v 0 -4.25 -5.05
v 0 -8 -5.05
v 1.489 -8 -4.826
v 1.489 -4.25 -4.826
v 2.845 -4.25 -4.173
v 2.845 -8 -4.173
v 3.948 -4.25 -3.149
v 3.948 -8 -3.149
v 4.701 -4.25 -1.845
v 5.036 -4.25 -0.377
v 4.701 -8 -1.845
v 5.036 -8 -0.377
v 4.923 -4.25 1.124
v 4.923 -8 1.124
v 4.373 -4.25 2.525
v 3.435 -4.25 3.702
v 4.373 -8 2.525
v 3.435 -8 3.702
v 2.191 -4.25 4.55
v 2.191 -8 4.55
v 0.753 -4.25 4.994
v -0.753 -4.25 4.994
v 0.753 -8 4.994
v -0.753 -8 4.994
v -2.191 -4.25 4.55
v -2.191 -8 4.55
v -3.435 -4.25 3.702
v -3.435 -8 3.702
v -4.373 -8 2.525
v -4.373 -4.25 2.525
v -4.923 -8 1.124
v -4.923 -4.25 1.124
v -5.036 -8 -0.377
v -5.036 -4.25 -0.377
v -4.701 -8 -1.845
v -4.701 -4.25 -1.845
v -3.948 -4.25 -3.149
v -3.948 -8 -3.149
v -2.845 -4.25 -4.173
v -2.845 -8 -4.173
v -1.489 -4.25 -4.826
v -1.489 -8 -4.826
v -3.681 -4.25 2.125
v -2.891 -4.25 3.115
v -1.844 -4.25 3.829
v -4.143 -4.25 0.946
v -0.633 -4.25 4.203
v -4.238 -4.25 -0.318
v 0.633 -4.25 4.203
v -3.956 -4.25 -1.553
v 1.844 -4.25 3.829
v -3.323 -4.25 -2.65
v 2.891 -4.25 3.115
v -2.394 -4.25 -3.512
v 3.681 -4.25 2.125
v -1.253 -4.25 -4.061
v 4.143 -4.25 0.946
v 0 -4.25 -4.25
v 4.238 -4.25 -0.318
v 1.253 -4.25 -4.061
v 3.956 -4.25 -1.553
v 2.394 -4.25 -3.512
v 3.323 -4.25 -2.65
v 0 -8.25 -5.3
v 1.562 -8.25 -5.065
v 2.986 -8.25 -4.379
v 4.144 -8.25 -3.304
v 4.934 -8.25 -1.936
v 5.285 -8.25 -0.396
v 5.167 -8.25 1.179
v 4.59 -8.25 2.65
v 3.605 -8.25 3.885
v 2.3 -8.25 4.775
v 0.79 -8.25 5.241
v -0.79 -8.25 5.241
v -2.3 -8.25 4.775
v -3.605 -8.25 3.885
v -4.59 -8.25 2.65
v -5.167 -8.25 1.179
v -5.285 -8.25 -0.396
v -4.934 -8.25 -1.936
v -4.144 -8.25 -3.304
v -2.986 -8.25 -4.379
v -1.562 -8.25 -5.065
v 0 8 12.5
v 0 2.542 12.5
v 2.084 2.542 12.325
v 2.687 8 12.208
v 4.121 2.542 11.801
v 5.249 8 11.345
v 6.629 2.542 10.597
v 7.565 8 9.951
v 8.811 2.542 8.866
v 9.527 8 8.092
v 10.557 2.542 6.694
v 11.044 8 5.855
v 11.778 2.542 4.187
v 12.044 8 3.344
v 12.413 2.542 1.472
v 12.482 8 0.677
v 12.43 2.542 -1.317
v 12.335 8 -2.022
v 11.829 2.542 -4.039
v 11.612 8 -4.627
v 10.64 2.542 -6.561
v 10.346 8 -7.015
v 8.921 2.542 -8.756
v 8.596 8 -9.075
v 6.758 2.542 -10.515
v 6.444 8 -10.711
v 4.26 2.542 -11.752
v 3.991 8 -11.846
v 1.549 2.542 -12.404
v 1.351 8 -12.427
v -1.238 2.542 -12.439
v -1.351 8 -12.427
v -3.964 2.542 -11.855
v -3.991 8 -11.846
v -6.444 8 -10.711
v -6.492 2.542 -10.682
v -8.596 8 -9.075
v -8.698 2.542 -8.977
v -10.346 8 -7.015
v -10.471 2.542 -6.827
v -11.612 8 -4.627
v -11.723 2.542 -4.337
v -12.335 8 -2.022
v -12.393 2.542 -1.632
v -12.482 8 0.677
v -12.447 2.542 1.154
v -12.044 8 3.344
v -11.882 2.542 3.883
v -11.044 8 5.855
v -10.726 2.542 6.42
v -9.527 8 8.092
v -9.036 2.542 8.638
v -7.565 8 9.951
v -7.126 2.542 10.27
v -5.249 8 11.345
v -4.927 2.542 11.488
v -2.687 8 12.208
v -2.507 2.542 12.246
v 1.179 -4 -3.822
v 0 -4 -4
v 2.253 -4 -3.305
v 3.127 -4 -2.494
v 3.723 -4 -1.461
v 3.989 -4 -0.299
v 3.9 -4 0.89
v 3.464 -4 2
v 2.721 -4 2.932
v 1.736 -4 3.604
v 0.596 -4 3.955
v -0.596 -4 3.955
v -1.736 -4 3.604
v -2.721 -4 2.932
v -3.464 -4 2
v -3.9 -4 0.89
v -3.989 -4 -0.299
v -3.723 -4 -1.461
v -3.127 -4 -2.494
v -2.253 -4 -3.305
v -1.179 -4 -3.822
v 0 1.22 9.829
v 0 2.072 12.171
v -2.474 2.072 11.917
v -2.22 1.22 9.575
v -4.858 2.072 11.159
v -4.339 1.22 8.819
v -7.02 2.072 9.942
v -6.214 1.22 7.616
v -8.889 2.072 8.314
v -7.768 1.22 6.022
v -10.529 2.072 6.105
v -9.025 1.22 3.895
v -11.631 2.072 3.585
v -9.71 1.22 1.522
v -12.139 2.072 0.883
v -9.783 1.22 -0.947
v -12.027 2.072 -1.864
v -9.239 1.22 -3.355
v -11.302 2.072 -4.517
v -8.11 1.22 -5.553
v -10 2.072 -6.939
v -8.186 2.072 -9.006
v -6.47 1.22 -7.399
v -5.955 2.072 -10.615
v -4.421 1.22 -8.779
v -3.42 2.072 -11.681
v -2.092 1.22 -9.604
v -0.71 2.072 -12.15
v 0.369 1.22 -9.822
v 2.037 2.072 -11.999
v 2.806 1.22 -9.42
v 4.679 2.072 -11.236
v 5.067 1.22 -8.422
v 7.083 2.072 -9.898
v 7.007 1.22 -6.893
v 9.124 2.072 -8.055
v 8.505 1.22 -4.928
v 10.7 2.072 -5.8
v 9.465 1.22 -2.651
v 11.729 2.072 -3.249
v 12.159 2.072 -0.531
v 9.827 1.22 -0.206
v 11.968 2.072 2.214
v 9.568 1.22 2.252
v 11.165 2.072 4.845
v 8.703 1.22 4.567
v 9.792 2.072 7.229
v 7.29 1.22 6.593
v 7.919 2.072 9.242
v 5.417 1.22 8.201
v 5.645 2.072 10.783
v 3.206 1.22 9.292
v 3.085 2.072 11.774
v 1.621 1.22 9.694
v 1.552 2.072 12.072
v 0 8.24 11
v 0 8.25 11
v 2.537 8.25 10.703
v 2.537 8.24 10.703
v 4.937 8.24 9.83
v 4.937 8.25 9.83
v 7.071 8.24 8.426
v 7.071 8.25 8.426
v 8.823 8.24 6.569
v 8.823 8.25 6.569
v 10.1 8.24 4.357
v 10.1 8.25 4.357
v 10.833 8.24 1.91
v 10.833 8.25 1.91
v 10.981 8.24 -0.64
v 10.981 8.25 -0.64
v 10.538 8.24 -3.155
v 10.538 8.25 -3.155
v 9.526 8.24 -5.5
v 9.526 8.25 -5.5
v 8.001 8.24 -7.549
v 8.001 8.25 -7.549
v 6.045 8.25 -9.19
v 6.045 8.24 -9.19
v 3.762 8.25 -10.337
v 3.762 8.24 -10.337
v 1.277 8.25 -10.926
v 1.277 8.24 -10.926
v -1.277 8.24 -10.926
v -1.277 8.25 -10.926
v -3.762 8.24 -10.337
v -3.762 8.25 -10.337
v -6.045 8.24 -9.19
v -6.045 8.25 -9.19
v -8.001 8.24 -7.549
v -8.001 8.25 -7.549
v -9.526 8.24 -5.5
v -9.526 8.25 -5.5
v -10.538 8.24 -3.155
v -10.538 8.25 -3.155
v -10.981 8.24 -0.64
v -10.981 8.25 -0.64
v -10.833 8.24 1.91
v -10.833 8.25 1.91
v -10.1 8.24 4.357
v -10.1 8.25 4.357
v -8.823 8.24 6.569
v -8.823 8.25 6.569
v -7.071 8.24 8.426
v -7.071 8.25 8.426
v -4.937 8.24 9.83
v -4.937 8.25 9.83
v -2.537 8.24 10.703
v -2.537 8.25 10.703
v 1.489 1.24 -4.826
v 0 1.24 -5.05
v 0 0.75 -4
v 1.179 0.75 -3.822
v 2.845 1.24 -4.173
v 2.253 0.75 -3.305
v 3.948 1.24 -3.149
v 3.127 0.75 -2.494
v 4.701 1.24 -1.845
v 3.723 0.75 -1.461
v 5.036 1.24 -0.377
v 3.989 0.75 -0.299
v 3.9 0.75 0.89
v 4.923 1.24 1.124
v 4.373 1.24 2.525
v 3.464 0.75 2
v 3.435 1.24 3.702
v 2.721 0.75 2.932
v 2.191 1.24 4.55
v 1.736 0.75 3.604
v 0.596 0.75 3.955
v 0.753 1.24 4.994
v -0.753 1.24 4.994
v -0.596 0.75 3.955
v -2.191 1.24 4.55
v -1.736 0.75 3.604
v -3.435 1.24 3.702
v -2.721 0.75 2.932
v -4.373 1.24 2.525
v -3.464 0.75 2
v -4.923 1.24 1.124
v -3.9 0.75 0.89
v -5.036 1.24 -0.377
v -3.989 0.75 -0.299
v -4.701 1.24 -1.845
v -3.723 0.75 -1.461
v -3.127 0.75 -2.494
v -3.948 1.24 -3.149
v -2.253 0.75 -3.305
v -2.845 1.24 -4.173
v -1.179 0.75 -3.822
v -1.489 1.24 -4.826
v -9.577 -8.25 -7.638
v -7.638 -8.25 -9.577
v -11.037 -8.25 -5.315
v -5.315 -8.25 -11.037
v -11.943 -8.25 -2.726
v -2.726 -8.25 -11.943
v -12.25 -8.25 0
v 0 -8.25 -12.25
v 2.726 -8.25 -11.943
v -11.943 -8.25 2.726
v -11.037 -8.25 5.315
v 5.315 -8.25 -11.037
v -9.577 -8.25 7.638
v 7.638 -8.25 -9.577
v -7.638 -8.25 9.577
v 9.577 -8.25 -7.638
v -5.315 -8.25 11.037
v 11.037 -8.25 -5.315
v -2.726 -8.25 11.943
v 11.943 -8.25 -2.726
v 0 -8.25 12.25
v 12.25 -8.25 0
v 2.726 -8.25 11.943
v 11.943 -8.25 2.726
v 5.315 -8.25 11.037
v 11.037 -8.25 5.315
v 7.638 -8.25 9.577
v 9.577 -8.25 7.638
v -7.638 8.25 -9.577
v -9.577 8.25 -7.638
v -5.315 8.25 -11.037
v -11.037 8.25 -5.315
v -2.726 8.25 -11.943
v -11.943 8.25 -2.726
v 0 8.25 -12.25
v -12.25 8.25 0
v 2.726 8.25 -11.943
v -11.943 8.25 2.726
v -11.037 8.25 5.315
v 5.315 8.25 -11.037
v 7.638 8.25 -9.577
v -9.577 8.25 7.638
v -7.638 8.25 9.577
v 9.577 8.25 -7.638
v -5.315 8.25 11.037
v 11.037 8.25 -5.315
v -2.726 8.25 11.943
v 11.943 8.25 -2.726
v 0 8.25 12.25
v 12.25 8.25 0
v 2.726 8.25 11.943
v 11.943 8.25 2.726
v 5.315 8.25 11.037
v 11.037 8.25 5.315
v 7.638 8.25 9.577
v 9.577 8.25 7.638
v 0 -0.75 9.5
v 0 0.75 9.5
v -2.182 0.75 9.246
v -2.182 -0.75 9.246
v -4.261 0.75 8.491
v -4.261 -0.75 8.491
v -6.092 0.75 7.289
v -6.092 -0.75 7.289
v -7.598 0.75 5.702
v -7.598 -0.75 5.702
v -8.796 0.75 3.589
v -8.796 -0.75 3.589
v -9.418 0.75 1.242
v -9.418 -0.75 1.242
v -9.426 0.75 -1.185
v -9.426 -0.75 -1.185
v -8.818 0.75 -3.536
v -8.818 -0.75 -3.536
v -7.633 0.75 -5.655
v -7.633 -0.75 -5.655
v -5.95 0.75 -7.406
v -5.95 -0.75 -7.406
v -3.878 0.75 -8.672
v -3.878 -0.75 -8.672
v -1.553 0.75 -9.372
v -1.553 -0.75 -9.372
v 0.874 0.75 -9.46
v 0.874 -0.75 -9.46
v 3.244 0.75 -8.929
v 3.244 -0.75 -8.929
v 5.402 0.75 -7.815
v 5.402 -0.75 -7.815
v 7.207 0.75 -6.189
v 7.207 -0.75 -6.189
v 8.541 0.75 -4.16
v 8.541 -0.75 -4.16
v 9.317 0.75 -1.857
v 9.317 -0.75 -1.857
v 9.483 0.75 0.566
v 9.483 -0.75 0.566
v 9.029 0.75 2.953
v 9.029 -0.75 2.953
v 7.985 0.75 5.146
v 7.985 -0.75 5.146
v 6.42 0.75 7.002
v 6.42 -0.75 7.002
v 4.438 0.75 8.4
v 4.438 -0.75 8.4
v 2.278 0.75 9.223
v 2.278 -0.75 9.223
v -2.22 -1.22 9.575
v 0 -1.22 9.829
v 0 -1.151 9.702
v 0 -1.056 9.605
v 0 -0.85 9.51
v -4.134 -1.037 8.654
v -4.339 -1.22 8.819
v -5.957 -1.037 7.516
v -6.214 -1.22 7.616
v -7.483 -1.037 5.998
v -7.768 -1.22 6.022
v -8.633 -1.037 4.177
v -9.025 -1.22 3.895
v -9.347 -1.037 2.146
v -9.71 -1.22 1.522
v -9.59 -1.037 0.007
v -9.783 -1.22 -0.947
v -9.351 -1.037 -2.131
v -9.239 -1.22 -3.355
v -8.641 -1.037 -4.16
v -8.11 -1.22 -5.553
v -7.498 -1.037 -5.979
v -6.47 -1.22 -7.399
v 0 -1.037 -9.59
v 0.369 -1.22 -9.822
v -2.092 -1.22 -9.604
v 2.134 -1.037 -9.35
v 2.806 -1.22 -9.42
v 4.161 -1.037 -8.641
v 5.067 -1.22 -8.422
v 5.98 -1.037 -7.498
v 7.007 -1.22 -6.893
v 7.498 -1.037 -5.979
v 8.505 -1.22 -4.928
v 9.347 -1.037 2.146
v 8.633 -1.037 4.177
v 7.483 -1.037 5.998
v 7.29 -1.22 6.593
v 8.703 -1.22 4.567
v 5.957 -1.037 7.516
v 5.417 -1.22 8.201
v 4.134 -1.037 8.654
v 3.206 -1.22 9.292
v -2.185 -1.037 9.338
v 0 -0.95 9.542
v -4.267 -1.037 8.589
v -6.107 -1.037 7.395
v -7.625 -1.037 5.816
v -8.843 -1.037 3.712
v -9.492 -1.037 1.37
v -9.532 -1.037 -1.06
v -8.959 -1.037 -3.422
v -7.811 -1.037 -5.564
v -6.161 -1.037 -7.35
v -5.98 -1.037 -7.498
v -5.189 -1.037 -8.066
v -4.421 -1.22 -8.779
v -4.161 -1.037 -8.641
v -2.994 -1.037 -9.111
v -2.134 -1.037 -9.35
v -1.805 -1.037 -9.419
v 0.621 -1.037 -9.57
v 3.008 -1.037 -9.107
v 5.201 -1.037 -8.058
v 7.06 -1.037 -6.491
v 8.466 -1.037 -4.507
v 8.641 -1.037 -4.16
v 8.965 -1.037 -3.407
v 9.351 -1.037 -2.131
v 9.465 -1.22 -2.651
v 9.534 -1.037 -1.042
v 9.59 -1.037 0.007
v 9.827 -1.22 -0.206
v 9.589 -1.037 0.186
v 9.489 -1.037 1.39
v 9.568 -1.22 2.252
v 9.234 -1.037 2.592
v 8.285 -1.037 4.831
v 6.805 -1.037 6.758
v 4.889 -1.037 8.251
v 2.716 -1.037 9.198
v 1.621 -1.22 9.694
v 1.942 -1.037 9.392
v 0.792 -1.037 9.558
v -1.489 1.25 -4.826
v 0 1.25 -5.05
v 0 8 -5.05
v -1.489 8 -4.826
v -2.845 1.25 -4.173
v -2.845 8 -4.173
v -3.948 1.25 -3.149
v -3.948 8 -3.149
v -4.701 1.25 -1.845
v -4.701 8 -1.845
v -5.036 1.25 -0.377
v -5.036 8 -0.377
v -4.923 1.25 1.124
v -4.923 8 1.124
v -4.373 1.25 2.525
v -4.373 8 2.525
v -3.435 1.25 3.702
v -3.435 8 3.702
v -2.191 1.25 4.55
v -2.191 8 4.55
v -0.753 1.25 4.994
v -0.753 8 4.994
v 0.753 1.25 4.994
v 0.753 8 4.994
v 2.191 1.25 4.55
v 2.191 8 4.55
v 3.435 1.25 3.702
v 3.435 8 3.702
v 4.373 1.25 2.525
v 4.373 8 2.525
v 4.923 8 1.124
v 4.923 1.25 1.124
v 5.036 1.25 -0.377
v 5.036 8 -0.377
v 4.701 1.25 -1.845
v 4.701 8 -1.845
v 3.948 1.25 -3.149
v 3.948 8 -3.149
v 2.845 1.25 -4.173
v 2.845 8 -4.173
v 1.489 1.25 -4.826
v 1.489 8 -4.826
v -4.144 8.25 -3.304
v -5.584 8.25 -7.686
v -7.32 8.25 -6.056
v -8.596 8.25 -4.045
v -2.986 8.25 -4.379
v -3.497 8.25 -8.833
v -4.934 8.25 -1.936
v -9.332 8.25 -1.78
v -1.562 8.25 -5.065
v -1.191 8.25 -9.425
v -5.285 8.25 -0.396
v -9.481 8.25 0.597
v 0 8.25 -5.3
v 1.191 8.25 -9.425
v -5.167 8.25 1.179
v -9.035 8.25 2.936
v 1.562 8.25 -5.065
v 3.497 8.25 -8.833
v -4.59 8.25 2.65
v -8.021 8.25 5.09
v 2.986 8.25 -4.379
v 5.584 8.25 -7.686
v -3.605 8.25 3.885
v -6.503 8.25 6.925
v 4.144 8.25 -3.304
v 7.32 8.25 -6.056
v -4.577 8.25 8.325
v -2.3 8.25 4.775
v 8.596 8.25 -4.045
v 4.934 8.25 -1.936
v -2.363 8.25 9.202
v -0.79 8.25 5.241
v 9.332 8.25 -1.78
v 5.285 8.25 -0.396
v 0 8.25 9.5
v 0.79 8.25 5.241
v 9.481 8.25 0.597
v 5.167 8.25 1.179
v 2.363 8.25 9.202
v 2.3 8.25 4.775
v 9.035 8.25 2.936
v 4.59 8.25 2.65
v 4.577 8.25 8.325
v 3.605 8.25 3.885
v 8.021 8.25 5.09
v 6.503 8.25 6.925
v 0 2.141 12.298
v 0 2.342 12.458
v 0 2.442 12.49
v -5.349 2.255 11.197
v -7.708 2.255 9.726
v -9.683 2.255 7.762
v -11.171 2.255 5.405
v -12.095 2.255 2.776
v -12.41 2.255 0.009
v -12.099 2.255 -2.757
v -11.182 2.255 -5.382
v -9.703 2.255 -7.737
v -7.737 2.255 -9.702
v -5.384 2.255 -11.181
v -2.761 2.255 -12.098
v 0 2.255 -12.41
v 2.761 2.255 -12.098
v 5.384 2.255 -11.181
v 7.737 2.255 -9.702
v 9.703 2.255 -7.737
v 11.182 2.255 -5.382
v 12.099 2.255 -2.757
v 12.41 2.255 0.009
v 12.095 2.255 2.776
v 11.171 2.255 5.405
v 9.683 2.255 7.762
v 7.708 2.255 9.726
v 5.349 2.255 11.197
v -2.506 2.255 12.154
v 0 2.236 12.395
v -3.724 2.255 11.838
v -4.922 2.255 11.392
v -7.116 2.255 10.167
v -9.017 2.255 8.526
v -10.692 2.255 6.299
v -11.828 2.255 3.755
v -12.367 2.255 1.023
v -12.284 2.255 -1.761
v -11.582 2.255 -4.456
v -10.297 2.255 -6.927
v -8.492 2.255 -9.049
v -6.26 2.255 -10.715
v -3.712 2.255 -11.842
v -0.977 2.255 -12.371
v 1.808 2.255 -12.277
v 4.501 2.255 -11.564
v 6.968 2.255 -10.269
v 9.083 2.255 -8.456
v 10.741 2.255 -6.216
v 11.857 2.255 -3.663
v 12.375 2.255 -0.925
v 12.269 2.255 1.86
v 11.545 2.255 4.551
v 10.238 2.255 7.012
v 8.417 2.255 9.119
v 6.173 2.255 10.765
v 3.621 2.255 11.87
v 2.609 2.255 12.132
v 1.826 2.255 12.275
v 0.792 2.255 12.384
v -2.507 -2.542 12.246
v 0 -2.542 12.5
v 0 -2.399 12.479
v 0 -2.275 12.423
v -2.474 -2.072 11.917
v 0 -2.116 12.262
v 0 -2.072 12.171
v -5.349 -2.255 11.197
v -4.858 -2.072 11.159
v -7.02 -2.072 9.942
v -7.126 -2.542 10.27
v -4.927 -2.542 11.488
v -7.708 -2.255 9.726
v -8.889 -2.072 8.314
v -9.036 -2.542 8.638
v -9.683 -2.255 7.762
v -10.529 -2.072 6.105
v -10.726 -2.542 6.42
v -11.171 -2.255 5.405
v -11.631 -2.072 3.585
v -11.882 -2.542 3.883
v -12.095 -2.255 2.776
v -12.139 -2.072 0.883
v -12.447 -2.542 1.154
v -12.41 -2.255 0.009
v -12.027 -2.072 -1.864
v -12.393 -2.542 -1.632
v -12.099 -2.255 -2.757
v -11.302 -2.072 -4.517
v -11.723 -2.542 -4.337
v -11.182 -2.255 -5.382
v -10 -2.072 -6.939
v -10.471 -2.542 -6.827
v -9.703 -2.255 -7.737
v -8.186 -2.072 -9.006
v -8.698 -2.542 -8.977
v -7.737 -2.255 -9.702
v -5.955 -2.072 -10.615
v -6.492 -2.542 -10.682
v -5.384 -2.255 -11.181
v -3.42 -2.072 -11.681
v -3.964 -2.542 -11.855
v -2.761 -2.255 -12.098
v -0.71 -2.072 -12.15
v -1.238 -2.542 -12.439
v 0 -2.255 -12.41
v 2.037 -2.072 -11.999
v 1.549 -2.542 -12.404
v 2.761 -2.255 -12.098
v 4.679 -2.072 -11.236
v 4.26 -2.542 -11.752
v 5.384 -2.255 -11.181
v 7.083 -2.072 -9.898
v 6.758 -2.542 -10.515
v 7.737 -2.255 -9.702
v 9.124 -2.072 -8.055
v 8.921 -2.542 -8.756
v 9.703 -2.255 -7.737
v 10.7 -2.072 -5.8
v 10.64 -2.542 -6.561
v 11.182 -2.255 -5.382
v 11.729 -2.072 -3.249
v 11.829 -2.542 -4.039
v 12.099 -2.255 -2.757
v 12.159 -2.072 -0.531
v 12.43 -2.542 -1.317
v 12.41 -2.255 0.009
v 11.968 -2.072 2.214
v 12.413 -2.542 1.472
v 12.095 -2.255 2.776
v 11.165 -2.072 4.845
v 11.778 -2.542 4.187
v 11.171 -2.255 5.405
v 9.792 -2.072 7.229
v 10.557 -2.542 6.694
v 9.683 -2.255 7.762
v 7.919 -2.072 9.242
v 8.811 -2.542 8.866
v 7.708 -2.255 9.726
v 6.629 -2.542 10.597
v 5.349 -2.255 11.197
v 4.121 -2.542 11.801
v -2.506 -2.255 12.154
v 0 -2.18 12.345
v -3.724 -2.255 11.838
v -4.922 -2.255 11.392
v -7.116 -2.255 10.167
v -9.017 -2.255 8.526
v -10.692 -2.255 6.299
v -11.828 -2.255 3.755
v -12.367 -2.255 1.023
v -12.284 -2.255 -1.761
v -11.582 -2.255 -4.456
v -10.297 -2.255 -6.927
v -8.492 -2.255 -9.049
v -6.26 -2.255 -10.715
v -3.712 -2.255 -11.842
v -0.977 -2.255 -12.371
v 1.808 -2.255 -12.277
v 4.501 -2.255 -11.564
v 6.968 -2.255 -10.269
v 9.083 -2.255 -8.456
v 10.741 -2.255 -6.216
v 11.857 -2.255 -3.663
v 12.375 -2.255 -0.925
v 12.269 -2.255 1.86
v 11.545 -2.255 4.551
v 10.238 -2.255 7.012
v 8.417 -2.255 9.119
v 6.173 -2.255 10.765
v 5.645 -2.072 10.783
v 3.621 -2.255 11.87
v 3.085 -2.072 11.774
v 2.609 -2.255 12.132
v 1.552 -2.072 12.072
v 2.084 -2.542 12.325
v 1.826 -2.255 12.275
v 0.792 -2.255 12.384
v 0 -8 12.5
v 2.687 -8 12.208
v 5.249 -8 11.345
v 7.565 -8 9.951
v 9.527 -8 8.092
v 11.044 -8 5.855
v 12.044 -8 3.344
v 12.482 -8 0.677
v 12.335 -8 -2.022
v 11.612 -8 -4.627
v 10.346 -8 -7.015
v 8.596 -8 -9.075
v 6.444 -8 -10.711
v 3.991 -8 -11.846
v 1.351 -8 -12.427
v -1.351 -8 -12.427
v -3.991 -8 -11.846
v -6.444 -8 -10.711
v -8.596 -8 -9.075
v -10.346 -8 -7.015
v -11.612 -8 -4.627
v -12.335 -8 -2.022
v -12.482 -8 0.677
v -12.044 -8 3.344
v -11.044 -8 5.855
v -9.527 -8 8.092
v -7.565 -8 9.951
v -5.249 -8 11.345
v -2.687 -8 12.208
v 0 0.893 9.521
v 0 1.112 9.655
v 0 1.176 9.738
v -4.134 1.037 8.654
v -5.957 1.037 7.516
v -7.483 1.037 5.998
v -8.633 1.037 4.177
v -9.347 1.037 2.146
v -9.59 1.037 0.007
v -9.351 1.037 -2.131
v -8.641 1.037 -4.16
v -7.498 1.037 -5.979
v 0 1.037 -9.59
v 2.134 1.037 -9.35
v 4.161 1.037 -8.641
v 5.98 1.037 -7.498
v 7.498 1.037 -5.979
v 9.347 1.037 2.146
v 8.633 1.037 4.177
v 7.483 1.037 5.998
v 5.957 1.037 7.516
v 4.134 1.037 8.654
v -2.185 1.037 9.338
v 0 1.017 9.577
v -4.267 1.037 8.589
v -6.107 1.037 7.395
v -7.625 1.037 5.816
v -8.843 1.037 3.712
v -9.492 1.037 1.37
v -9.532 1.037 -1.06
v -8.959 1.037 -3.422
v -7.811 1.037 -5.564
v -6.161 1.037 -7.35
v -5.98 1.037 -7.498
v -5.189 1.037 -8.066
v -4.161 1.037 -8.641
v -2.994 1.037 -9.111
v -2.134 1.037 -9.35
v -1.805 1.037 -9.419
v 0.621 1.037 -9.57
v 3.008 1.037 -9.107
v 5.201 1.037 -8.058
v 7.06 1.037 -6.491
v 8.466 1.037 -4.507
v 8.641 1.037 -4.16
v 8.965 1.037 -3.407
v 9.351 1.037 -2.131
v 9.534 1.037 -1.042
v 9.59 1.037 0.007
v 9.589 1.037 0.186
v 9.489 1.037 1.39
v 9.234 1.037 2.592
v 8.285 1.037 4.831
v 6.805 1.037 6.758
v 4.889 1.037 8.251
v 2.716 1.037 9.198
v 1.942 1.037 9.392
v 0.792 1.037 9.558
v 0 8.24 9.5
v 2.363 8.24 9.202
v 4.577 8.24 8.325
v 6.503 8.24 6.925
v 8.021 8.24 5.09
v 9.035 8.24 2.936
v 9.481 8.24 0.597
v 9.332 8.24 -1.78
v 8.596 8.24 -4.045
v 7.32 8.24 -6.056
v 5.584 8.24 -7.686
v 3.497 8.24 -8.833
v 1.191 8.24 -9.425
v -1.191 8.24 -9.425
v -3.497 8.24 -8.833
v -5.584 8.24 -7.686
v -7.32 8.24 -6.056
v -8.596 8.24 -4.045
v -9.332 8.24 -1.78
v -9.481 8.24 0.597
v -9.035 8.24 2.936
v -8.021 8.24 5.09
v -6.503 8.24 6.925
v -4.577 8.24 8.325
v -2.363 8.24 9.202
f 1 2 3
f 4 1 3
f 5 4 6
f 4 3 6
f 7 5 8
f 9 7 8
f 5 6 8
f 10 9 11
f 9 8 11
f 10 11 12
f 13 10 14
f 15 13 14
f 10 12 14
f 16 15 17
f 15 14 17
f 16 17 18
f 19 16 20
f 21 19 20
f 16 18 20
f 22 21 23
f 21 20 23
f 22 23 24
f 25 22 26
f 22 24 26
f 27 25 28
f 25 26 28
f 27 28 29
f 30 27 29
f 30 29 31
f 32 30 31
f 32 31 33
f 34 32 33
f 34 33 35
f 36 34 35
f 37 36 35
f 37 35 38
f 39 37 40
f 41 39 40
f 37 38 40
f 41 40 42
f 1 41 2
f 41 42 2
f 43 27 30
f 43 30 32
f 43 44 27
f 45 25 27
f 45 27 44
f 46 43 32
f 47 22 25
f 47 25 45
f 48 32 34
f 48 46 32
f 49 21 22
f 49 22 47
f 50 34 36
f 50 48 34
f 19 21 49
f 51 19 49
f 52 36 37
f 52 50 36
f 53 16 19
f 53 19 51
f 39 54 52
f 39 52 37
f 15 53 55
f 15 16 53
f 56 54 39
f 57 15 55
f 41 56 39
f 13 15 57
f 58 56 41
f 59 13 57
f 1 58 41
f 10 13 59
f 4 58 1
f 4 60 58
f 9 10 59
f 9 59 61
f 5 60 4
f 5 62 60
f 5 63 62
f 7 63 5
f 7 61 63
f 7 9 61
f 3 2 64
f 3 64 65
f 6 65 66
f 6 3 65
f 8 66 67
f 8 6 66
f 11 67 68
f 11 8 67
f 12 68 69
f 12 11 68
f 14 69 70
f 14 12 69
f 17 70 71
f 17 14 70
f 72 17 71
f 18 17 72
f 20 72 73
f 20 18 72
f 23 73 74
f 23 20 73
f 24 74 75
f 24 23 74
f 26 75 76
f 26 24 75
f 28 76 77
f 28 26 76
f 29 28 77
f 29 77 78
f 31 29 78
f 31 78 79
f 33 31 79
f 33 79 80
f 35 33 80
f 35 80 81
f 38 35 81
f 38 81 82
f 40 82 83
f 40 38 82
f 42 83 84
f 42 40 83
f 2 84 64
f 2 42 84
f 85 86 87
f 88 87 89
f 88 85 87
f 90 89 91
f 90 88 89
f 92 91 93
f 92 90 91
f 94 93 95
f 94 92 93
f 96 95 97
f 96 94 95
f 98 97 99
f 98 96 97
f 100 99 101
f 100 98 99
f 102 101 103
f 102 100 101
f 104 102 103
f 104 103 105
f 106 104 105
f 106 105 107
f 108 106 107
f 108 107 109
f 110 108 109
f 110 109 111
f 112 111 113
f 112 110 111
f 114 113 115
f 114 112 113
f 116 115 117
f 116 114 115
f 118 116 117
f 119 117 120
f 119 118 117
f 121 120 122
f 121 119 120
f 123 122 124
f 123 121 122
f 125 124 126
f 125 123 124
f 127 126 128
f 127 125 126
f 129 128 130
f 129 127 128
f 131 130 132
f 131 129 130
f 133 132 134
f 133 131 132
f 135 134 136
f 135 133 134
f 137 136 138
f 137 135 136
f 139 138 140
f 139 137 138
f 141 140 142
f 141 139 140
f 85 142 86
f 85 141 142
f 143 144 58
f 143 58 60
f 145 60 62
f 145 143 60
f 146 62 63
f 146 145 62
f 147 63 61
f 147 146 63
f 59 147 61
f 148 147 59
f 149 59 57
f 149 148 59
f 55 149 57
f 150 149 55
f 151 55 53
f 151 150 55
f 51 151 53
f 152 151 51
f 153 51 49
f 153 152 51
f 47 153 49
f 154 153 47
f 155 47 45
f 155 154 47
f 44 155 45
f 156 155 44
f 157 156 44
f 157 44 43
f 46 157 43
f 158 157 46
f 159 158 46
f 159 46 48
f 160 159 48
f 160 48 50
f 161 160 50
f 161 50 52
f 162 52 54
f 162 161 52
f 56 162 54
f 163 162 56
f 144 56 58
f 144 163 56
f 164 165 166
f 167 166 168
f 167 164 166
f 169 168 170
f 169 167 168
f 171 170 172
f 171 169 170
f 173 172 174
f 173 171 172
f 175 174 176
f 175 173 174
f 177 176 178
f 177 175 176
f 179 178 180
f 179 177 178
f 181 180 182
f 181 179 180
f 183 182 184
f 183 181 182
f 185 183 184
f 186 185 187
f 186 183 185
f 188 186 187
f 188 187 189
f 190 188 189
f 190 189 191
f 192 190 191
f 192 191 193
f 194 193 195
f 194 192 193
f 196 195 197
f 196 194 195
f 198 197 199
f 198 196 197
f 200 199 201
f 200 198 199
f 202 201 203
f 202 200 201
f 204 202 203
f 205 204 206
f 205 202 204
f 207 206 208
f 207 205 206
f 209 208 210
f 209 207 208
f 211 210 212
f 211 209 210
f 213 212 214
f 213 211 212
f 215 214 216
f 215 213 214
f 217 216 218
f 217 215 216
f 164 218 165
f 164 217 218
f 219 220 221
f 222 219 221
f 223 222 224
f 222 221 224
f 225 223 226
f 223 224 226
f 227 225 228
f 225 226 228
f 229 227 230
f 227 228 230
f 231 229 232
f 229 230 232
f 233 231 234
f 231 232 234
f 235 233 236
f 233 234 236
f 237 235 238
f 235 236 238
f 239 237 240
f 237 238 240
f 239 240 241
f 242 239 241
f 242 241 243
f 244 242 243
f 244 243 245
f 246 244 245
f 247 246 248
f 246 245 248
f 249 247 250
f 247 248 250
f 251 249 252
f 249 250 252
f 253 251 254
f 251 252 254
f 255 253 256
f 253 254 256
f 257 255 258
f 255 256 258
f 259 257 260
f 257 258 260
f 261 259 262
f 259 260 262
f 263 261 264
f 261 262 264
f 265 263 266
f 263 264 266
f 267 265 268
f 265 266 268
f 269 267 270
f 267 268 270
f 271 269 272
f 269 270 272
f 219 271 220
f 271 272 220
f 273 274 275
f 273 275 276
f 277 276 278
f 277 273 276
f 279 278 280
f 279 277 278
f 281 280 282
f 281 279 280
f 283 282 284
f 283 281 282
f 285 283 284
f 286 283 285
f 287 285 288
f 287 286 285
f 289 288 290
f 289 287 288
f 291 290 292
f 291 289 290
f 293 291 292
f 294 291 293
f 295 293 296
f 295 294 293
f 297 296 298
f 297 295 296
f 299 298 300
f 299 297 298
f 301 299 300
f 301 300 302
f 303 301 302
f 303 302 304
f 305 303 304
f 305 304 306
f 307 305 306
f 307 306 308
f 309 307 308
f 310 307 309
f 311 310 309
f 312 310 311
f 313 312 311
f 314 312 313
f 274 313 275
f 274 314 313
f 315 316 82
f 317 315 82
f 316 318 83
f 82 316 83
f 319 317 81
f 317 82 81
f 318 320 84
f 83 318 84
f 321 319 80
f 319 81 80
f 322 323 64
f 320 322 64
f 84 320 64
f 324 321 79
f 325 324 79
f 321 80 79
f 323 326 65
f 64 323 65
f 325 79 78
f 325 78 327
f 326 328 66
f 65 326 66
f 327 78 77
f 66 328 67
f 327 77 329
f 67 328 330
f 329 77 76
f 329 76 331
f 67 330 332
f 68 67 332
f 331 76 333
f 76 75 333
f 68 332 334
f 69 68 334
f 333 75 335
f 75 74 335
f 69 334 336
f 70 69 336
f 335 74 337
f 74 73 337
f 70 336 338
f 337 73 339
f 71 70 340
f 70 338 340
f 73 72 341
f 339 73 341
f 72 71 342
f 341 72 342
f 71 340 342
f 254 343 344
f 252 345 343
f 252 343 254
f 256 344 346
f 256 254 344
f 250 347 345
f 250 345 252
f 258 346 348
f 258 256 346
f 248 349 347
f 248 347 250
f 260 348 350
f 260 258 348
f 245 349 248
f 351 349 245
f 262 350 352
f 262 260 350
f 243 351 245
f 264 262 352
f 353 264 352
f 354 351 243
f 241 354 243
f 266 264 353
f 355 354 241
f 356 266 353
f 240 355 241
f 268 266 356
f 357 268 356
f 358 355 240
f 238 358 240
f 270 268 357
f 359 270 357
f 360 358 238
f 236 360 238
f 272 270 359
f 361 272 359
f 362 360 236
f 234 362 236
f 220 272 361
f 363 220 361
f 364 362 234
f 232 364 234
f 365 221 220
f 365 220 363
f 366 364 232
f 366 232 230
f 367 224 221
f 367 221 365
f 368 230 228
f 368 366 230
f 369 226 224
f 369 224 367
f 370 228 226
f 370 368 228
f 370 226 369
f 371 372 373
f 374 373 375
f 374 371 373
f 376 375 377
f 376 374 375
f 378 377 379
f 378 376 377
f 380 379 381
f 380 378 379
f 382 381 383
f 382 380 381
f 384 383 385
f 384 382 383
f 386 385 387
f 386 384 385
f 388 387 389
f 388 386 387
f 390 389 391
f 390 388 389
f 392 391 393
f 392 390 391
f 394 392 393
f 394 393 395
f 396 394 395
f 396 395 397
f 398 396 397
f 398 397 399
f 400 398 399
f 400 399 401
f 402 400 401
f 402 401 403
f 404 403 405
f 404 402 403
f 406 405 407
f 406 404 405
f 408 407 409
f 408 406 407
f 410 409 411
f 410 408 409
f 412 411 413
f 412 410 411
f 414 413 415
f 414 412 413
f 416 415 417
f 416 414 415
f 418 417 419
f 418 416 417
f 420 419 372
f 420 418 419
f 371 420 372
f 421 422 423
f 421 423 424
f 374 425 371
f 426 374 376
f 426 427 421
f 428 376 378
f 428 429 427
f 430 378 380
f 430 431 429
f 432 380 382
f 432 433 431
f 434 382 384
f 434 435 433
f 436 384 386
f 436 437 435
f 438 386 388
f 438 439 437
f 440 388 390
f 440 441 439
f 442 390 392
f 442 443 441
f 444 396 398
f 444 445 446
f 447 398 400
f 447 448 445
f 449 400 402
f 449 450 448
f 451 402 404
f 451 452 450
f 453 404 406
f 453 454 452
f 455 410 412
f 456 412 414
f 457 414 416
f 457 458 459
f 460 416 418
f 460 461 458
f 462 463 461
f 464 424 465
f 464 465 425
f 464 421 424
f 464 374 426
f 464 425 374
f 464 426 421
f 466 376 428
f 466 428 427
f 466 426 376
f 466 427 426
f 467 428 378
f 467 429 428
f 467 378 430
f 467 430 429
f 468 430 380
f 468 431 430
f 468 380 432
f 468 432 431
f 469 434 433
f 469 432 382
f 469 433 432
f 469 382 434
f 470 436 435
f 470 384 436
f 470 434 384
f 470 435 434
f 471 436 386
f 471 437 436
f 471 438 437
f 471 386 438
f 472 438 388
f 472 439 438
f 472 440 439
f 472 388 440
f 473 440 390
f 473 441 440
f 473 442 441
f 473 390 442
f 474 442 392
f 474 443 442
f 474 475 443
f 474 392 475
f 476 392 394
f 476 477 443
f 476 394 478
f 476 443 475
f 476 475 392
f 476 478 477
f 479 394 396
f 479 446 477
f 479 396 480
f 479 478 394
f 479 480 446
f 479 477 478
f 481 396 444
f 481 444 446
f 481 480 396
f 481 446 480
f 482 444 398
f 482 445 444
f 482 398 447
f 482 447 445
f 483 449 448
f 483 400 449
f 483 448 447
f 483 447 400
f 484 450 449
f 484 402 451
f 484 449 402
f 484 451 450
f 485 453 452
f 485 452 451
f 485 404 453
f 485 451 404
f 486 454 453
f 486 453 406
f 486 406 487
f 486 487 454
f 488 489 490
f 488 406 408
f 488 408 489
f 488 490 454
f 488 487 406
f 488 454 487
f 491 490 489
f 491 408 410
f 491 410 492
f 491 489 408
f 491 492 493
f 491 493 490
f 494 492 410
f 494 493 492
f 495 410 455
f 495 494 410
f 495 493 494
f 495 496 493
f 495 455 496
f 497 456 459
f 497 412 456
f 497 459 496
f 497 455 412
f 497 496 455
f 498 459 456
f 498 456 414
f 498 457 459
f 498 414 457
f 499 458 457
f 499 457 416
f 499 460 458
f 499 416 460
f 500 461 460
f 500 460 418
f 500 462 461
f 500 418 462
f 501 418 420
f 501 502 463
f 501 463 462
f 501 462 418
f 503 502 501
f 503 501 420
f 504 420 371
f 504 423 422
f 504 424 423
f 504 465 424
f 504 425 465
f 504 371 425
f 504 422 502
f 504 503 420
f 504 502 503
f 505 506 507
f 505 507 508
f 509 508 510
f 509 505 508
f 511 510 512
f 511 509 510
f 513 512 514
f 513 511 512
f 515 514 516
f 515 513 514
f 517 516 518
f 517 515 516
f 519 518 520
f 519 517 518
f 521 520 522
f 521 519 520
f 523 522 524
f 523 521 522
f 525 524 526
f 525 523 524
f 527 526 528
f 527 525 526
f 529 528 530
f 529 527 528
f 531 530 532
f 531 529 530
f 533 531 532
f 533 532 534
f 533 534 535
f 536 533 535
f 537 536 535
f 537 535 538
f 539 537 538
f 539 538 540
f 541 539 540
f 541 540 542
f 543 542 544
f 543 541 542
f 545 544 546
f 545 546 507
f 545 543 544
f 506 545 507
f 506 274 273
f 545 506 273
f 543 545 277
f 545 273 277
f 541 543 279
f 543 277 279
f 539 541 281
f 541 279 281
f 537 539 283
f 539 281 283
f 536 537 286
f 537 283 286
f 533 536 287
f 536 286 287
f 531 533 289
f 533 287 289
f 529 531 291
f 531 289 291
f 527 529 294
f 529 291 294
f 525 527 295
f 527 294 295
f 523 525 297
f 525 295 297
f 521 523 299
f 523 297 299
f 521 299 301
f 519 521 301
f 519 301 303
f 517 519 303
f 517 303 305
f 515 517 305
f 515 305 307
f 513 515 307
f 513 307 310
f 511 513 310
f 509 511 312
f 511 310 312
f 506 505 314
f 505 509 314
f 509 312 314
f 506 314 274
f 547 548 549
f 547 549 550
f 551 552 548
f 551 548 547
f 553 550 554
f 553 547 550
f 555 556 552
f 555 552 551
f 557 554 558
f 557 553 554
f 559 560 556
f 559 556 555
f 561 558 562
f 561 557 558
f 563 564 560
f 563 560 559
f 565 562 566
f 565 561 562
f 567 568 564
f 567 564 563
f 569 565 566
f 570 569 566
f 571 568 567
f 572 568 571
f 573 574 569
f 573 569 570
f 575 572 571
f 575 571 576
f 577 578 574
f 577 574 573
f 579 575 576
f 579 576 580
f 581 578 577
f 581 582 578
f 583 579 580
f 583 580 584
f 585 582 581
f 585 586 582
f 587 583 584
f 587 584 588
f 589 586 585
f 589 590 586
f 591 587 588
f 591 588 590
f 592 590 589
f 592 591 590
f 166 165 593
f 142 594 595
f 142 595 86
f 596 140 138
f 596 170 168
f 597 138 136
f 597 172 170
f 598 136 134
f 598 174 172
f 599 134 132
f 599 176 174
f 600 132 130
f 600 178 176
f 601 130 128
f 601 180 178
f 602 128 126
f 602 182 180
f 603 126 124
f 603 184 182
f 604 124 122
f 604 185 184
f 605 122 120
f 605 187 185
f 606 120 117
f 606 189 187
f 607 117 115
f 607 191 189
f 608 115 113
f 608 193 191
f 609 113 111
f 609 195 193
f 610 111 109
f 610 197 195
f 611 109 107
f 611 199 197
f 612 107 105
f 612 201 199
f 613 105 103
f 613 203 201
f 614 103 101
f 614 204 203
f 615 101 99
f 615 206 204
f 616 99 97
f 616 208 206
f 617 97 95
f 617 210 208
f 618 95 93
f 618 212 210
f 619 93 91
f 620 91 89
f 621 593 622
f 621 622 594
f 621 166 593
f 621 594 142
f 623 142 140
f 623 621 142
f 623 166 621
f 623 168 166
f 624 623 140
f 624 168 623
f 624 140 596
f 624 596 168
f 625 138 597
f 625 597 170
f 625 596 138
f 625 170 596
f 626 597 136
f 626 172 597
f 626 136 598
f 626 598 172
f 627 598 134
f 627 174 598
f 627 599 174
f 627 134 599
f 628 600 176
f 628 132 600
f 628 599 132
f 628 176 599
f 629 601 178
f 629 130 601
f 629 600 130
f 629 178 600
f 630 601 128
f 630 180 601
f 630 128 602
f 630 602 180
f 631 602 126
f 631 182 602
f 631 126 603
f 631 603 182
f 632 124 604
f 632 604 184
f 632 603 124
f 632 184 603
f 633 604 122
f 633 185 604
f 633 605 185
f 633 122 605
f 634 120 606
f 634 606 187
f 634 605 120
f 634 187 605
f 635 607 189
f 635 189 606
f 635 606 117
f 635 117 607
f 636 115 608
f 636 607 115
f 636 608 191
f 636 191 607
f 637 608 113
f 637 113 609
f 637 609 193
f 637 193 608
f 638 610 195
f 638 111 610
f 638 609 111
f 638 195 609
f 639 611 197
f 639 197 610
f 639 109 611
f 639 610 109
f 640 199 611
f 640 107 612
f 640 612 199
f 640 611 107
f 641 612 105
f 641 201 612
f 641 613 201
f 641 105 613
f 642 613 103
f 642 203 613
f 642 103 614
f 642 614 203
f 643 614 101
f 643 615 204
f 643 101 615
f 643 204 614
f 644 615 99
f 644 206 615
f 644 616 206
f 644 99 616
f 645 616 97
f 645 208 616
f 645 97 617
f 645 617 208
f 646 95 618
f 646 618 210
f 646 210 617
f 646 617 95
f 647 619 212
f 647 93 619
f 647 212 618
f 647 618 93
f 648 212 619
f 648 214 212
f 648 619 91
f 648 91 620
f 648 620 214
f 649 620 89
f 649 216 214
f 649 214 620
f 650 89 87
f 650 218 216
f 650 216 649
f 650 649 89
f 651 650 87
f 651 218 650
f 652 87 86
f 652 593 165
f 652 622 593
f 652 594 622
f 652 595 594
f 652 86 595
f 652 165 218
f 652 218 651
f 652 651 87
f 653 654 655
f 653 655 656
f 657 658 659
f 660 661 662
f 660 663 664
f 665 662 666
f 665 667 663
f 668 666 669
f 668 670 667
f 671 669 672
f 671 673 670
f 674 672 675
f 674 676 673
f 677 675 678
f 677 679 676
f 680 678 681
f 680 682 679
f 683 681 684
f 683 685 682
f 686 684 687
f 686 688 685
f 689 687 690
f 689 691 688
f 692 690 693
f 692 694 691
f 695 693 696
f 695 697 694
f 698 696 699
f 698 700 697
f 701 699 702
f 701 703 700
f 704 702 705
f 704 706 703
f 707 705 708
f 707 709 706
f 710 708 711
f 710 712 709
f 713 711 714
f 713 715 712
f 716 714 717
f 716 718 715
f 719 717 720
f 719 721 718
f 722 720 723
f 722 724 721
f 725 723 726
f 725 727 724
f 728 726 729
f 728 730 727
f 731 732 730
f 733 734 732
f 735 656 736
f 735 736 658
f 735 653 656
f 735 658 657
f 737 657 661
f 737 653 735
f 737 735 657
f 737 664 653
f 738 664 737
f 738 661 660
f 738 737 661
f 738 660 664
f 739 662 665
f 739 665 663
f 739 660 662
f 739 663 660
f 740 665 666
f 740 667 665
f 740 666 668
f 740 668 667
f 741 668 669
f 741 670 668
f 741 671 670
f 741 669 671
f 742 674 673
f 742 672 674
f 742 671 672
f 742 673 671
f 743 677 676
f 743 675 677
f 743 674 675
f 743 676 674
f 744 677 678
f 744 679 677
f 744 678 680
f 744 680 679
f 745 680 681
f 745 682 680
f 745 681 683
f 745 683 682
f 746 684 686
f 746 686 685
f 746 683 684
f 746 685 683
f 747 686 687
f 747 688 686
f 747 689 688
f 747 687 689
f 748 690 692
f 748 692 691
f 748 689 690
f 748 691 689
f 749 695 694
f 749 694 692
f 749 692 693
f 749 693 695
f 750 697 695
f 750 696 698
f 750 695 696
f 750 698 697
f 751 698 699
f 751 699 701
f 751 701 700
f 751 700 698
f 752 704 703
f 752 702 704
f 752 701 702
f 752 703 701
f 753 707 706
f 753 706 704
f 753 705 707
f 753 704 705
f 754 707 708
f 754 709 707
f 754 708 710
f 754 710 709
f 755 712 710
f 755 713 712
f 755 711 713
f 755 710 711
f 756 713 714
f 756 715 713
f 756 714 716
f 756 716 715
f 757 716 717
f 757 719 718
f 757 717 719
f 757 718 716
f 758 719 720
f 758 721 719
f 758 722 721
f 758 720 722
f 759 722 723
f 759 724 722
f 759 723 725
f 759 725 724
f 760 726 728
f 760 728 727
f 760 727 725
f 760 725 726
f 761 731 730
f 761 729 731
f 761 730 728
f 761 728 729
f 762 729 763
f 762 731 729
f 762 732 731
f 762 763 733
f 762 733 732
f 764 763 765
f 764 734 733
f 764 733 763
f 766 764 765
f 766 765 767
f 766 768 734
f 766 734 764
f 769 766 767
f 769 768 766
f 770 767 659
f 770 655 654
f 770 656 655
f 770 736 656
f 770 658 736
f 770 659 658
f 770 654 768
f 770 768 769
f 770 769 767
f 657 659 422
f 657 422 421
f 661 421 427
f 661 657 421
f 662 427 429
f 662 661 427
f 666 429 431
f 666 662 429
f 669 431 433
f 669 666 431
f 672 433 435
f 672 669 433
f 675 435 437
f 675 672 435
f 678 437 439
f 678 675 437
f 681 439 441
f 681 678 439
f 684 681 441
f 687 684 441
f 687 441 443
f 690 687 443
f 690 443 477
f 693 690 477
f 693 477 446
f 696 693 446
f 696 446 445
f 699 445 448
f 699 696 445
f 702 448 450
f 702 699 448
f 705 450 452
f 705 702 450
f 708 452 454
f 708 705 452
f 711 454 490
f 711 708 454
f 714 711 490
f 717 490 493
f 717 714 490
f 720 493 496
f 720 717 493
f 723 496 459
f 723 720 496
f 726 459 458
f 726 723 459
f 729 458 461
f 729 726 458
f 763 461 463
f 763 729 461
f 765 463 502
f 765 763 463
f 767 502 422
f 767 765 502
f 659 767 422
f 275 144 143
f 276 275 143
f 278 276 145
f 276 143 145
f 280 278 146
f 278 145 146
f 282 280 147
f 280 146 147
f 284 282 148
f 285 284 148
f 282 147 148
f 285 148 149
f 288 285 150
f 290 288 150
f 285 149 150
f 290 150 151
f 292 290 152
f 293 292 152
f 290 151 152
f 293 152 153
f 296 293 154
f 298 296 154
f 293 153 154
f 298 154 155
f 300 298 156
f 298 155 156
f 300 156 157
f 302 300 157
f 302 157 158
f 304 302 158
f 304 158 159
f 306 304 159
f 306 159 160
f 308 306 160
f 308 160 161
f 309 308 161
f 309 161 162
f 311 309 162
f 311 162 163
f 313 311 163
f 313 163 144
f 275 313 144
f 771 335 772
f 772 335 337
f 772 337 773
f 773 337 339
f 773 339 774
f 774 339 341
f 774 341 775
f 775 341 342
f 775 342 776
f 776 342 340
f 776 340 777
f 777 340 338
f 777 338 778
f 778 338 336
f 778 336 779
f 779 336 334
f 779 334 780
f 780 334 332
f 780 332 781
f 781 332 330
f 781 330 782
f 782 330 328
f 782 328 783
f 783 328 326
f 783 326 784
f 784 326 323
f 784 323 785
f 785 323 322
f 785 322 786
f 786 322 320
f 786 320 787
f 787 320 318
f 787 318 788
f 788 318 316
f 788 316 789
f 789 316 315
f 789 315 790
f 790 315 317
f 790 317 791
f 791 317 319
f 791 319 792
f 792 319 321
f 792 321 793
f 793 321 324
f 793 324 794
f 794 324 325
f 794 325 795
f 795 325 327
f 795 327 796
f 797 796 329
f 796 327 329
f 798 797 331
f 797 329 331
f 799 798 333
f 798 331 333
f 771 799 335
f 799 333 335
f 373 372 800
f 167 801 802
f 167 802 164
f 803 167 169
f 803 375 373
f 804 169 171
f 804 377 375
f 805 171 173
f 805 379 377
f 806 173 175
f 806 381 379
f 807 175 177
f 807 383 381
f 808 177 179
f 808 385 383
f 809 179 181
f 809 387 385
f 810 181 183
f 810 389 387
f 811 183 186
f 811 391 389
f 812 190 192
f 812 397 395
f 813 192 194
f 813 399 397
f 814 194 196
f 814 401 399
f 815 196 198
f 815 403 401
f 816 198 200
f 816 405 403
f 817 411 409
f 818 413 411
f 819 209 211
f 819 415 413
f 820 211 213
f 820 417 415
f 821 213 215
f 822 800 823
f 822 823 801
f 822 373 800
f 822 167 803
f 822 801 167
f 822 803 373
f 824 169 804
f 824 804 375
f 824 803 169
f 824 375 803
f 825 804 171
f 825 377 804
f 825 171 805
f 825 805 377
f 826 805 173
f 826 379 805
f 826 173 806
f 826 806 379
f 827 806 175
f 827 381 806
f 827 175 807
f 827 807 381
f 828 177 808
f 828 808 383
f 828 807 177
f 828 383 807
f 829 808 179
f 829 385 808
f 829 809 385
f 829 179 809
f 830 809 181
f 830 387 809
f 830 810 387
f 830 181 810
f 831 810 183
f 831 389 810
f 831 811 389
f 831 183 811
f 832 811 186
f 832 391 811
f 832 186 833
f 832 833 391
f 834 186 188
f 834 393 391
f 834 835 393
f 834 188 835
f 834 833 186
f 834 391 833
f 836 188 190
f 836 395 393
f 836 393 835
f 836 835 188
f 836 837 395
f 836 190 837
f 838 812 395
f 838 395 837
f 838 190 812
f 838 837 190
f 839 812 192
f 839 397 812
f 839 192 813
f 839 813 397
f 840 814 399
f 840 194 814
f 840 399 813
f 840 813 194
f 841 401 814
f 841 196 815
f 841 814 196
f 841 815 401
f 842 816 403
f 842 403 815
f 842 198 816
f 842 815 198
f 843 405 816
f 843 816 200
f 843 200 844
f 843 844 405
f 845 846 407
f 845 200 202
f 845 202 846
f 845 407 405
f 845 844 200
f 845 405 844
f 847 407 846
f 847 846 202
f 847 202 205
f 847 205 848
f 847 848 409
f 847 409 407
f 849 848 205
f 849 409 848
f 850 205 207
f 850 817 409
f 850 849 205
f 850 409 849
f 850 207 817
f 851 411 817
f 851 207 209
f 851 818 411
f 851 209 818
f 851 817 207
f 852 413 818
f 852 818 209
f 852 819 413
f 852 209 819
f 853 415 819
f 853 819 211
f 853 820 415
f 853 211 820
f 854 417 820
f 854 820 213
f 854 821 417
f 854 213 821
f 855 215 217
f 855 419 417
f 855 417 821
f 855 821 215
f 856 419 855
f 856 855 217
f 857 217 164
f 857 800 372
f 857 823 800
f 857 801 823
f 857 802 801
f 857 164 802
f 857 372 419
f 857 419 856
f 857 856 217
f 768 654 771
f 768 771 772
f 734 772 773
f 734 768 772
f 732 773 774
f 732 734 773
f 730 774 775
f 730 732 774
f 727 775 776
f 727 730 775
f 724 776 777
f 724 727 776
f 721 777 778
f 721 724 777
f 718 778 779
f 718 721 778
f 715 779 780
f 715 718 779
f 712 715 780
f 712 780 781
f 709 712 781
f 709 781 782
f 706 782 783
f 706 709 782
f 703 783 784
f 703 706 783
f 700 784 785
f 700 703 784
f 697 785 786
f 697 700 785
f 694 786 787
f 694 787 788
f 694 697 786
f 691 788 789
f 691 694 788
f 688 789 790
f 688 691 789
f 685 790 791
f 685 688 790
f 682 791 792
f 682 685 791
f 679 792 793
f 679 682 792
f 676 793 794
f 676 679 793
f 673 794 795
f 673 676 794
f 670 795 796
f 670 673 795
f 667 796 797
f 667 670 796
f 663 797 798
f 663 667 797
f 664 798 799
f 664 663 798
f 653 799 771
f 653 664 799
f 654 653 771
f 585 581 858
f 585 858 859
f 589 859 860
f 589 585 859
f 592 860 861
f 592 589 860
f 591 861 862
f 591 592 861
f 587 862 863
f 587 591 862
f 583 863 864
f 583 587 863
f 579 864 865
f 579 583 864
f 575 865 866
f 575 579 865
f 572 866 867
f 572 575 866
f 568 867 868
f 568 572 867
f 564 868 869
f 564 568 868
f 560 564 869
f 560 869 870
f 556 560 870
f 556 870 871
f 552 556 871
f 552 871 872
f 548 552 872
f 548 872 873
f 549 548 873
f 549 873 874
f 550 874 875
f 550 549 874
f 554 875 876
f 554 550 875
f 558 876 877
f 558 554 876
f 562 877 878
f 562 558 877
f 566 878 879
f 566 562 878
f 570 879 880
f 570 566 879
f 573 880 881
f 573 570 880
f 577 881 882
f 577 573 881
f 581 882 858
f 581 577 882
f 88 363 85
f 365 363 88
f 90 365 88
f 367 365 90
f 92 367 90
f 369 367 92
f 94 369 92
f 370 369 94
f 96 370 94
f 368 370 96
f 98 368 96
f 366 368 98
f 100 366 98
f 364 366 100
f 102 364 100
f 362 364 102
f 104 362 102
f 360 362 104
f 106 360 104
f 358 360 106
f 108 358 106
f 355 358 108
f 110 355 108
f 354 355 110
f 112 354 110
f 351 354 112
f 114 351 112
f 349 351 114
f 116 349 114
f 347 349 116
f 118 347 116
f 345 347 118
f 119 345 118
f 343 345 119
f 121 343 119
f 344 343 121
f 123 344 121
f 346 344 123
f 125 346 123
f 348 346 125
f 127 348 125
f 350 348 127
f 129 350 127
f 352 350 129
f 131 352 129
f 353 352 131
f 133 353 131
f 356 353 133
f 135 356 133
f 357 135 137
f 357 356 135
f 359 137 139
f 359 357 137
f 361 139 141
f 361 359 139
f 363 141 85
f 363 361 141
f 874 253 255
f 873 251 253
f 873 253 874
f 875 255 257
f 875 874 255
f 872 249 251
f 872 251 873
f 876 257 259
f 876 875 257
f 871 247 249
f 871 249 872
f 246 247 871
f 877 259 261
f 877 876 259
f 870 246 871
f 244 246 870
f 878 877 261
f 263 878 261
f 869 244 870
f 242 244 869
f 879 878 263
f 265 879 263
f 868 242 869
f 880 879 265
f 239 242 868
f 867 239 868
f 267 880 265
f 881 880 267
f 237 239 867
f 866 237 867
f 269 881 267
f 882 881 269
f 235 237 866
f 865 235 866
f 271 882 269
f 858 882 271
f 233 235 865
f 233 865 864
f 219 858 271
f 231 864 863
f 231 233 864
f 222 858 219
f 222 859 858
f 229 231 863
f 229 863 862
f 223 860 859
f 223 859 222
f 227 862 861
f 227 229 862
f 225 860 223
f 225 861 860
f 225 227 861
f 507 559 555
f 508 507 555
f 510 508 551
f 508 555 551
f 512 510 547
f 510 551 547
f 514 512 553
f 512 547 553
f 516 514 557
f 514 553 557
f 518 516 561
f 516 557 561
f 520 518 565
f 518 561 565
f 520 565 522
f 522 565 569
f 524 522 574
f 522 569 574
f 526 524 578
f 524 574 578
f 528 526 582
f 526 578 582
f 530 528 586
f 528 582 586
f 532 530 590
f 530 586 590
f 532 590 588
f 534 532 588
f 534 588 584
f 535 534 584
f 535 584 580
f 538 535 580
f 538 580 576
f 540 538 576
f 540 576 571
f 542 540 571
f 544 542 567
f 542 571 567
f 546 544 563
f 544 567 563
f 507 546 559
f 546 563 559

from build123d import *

# Parameters (mm, degrees)
SKETCH1_R           = 12.5
BOSS_EXTRUDE1_DEPTH = 8.25
CUT_EXTRUDE1_REACH  = 26.182
SKETCH2_R           = 4
SKETCH11_R          = 5.05
CUT_EXTRUDE5_DEPTH  = 4
CUT_EXTRUDE6_START  = -7
SKETCH12_R          = 5.05
CUT_EXTRUDE6_DEPTH  = 7
SKETCH7_R           = 11
SKETCH7_R_2         = 9.5
CUT_EXTRUDE4_DEPTH  = 0.01
CHAMFER2_SIZE       = 0.5
CHAMFER2_SIZE_2     = 1.07225346
FILLET4_R           = 0.5
CHAMFER1_SIZE       = 0.25


with BuildPart() as part:
    # Sketch1 → Boss-Extrude1 (new, symmetric)
    with BuildSketch(Plane(origin=(0, 0, 0), x_dir=(1, 0, 0), z_dir=(0, 1, 0))):
        with Locations(Location((0, 0, 0), (0, 0, 270))):
            Circle(SKETCH1_R)
    extrude(amount=BOSS_EXTRUDE1_DEPTH, both=True)

    # Sketch2 → Cut-Extrude1 (cut, up to next)
    with BuildSketch(Plane.XZ.offset(8.25), mode=Mode.PRIVATE) as cut_extrude1_sk1:
        with Locations(Location((0, 0, 0), (0, 0, 270))):
            Circle(SKETCH2_R)
    cut_extrude1_tool1 = extrude(cut_extrude1_sk1.sketch, amount=-CUT_EXTRUDE1_REACH, mode=Mode.PRIVATE) & part.part
    add(cut_extrude1_tool1.solids().sort_by_distance((0, -8.25, 0))[0], mode=Mode.SUBTRACT)

    # Sketch11 → Cut-Extrude5 (cut)
    with BuildSketch(Plane.XZ.offset(8.25)):
        with Locations(Location((0, 0, 0), (0, 0, 270))):
            Circle(SKETCH11_R)
    extrude(amount=-CUT_EXTRUDE5_DEPTH, mode=Mode.SUBTRACT)

    # Sketch12 → Cut-Extrude6 (cut)
    with BuildSketch(Plane(origin=(0, 8.25, 0), x_dir=(1, 0, 0), z_dir=(0, 1, 0)).offset(CUT_EXTRUDE6_START)):
        with Locations(Location((0, 0, 0), (0, 0, 90))):
            Circle(SKETCH12_R)
    extrude(amount=CUT_EXTRUDE6_DEPTH, mode=Mode.SUBTRACT)

    # Sketch7 → Cut-Extrude4 (cut)
    with BuildSketch(Plane(origin=(0, 8.25, 0), x_dir=(1, 0, 0), z_dir=(0, 1, 0))):
        with Locations(Location((0, 0, 0), (0, 0, 270))):
            Circle(SKETCH7_R)
        with Locations(Location((0, 0, 0), (0, 0, 270))):
            Circle(SKETCH7_R_2, mode=Mode.SUBTRACT)
    extrude(amount=-CUT_EXTRUDE4_DEPTH, mode=Mode.SUBTRACT)

    # Sketch10 → Cut-Revolve1 (revolve, cut)
    with BuildSketch(Plane.XY, mode=Mode.PRIVATE) as cut_revolve1_sk:
        Polygon((12.5, 2.191910703), (9.5, 1.1), (9.5, -1.1), (12.5, -2.191910703), align=None)
    revolve(cut_revolve1_sk.sketch.rotate(Axis((0, 8.25, 0), (0, -1, 0)), 90), axis=Axis((0, 8.25, 0), (0, -1, 0)), mode=Mode.SUBTRACT)

    # Chamfer2
    # the kernel refuses this chamfer: 1.07225346, 0.5 mm, written as the material it takes off along each edge
    with BuildSketch(Plane(origin=(0, 1.25, 0), x_dir=(0, 0, -1), z_dir=(-1, 0, 0))) as chamfer2_piece_1_section:
        Polygon((4, CHAMFER2_SIZE), (4 + CHAMFER2_SIZE_2, 0), (4, 0), align=None)
    chamfer2_piece_1 = revolve(axis=Axis((0, 1.25, 0), (0, -1, 0)), mode=Mode.PRIVATE)
    chamfer2_piece_1 = chamfer2_piece_1 & Plane(origin=(0, 1.004178962, 0), x_dir=(0, 0, -1), z_dir=(0, -1, 0)) * Cylinder(5.05, 21, mode=Mode.PRIVATE)
    add(chamfer2_piece_1, mode=Mode.SUBTRACT)

    # Fillet4
    fillet4_edges = [part.edges().sort_by_distance(p)[0] for p in [
        (0, -2.191910703, -12.5),
        (0, -1.1, -9.5),
        (0, 1.1, -9.5),
        (0, 2.191910703, -12.5),
    ]]
    fillet(fillet4_edges, radius=FILLET4_R)

    # Chamfer1
    chamfer1_edges = [part.edges().sort_by_distance(p)[0] for p in [
        (0, -8.25, 5.05),
        (0, -4.25, 4),
        (0, 8.25, 5.05),
        (0, -8.25, -12.5),
        (0, 8.25, -12.5),
    ]]
    chamfer(chamfer1_edges, length=CHAMFER1_SIZE)


solid = part.part
